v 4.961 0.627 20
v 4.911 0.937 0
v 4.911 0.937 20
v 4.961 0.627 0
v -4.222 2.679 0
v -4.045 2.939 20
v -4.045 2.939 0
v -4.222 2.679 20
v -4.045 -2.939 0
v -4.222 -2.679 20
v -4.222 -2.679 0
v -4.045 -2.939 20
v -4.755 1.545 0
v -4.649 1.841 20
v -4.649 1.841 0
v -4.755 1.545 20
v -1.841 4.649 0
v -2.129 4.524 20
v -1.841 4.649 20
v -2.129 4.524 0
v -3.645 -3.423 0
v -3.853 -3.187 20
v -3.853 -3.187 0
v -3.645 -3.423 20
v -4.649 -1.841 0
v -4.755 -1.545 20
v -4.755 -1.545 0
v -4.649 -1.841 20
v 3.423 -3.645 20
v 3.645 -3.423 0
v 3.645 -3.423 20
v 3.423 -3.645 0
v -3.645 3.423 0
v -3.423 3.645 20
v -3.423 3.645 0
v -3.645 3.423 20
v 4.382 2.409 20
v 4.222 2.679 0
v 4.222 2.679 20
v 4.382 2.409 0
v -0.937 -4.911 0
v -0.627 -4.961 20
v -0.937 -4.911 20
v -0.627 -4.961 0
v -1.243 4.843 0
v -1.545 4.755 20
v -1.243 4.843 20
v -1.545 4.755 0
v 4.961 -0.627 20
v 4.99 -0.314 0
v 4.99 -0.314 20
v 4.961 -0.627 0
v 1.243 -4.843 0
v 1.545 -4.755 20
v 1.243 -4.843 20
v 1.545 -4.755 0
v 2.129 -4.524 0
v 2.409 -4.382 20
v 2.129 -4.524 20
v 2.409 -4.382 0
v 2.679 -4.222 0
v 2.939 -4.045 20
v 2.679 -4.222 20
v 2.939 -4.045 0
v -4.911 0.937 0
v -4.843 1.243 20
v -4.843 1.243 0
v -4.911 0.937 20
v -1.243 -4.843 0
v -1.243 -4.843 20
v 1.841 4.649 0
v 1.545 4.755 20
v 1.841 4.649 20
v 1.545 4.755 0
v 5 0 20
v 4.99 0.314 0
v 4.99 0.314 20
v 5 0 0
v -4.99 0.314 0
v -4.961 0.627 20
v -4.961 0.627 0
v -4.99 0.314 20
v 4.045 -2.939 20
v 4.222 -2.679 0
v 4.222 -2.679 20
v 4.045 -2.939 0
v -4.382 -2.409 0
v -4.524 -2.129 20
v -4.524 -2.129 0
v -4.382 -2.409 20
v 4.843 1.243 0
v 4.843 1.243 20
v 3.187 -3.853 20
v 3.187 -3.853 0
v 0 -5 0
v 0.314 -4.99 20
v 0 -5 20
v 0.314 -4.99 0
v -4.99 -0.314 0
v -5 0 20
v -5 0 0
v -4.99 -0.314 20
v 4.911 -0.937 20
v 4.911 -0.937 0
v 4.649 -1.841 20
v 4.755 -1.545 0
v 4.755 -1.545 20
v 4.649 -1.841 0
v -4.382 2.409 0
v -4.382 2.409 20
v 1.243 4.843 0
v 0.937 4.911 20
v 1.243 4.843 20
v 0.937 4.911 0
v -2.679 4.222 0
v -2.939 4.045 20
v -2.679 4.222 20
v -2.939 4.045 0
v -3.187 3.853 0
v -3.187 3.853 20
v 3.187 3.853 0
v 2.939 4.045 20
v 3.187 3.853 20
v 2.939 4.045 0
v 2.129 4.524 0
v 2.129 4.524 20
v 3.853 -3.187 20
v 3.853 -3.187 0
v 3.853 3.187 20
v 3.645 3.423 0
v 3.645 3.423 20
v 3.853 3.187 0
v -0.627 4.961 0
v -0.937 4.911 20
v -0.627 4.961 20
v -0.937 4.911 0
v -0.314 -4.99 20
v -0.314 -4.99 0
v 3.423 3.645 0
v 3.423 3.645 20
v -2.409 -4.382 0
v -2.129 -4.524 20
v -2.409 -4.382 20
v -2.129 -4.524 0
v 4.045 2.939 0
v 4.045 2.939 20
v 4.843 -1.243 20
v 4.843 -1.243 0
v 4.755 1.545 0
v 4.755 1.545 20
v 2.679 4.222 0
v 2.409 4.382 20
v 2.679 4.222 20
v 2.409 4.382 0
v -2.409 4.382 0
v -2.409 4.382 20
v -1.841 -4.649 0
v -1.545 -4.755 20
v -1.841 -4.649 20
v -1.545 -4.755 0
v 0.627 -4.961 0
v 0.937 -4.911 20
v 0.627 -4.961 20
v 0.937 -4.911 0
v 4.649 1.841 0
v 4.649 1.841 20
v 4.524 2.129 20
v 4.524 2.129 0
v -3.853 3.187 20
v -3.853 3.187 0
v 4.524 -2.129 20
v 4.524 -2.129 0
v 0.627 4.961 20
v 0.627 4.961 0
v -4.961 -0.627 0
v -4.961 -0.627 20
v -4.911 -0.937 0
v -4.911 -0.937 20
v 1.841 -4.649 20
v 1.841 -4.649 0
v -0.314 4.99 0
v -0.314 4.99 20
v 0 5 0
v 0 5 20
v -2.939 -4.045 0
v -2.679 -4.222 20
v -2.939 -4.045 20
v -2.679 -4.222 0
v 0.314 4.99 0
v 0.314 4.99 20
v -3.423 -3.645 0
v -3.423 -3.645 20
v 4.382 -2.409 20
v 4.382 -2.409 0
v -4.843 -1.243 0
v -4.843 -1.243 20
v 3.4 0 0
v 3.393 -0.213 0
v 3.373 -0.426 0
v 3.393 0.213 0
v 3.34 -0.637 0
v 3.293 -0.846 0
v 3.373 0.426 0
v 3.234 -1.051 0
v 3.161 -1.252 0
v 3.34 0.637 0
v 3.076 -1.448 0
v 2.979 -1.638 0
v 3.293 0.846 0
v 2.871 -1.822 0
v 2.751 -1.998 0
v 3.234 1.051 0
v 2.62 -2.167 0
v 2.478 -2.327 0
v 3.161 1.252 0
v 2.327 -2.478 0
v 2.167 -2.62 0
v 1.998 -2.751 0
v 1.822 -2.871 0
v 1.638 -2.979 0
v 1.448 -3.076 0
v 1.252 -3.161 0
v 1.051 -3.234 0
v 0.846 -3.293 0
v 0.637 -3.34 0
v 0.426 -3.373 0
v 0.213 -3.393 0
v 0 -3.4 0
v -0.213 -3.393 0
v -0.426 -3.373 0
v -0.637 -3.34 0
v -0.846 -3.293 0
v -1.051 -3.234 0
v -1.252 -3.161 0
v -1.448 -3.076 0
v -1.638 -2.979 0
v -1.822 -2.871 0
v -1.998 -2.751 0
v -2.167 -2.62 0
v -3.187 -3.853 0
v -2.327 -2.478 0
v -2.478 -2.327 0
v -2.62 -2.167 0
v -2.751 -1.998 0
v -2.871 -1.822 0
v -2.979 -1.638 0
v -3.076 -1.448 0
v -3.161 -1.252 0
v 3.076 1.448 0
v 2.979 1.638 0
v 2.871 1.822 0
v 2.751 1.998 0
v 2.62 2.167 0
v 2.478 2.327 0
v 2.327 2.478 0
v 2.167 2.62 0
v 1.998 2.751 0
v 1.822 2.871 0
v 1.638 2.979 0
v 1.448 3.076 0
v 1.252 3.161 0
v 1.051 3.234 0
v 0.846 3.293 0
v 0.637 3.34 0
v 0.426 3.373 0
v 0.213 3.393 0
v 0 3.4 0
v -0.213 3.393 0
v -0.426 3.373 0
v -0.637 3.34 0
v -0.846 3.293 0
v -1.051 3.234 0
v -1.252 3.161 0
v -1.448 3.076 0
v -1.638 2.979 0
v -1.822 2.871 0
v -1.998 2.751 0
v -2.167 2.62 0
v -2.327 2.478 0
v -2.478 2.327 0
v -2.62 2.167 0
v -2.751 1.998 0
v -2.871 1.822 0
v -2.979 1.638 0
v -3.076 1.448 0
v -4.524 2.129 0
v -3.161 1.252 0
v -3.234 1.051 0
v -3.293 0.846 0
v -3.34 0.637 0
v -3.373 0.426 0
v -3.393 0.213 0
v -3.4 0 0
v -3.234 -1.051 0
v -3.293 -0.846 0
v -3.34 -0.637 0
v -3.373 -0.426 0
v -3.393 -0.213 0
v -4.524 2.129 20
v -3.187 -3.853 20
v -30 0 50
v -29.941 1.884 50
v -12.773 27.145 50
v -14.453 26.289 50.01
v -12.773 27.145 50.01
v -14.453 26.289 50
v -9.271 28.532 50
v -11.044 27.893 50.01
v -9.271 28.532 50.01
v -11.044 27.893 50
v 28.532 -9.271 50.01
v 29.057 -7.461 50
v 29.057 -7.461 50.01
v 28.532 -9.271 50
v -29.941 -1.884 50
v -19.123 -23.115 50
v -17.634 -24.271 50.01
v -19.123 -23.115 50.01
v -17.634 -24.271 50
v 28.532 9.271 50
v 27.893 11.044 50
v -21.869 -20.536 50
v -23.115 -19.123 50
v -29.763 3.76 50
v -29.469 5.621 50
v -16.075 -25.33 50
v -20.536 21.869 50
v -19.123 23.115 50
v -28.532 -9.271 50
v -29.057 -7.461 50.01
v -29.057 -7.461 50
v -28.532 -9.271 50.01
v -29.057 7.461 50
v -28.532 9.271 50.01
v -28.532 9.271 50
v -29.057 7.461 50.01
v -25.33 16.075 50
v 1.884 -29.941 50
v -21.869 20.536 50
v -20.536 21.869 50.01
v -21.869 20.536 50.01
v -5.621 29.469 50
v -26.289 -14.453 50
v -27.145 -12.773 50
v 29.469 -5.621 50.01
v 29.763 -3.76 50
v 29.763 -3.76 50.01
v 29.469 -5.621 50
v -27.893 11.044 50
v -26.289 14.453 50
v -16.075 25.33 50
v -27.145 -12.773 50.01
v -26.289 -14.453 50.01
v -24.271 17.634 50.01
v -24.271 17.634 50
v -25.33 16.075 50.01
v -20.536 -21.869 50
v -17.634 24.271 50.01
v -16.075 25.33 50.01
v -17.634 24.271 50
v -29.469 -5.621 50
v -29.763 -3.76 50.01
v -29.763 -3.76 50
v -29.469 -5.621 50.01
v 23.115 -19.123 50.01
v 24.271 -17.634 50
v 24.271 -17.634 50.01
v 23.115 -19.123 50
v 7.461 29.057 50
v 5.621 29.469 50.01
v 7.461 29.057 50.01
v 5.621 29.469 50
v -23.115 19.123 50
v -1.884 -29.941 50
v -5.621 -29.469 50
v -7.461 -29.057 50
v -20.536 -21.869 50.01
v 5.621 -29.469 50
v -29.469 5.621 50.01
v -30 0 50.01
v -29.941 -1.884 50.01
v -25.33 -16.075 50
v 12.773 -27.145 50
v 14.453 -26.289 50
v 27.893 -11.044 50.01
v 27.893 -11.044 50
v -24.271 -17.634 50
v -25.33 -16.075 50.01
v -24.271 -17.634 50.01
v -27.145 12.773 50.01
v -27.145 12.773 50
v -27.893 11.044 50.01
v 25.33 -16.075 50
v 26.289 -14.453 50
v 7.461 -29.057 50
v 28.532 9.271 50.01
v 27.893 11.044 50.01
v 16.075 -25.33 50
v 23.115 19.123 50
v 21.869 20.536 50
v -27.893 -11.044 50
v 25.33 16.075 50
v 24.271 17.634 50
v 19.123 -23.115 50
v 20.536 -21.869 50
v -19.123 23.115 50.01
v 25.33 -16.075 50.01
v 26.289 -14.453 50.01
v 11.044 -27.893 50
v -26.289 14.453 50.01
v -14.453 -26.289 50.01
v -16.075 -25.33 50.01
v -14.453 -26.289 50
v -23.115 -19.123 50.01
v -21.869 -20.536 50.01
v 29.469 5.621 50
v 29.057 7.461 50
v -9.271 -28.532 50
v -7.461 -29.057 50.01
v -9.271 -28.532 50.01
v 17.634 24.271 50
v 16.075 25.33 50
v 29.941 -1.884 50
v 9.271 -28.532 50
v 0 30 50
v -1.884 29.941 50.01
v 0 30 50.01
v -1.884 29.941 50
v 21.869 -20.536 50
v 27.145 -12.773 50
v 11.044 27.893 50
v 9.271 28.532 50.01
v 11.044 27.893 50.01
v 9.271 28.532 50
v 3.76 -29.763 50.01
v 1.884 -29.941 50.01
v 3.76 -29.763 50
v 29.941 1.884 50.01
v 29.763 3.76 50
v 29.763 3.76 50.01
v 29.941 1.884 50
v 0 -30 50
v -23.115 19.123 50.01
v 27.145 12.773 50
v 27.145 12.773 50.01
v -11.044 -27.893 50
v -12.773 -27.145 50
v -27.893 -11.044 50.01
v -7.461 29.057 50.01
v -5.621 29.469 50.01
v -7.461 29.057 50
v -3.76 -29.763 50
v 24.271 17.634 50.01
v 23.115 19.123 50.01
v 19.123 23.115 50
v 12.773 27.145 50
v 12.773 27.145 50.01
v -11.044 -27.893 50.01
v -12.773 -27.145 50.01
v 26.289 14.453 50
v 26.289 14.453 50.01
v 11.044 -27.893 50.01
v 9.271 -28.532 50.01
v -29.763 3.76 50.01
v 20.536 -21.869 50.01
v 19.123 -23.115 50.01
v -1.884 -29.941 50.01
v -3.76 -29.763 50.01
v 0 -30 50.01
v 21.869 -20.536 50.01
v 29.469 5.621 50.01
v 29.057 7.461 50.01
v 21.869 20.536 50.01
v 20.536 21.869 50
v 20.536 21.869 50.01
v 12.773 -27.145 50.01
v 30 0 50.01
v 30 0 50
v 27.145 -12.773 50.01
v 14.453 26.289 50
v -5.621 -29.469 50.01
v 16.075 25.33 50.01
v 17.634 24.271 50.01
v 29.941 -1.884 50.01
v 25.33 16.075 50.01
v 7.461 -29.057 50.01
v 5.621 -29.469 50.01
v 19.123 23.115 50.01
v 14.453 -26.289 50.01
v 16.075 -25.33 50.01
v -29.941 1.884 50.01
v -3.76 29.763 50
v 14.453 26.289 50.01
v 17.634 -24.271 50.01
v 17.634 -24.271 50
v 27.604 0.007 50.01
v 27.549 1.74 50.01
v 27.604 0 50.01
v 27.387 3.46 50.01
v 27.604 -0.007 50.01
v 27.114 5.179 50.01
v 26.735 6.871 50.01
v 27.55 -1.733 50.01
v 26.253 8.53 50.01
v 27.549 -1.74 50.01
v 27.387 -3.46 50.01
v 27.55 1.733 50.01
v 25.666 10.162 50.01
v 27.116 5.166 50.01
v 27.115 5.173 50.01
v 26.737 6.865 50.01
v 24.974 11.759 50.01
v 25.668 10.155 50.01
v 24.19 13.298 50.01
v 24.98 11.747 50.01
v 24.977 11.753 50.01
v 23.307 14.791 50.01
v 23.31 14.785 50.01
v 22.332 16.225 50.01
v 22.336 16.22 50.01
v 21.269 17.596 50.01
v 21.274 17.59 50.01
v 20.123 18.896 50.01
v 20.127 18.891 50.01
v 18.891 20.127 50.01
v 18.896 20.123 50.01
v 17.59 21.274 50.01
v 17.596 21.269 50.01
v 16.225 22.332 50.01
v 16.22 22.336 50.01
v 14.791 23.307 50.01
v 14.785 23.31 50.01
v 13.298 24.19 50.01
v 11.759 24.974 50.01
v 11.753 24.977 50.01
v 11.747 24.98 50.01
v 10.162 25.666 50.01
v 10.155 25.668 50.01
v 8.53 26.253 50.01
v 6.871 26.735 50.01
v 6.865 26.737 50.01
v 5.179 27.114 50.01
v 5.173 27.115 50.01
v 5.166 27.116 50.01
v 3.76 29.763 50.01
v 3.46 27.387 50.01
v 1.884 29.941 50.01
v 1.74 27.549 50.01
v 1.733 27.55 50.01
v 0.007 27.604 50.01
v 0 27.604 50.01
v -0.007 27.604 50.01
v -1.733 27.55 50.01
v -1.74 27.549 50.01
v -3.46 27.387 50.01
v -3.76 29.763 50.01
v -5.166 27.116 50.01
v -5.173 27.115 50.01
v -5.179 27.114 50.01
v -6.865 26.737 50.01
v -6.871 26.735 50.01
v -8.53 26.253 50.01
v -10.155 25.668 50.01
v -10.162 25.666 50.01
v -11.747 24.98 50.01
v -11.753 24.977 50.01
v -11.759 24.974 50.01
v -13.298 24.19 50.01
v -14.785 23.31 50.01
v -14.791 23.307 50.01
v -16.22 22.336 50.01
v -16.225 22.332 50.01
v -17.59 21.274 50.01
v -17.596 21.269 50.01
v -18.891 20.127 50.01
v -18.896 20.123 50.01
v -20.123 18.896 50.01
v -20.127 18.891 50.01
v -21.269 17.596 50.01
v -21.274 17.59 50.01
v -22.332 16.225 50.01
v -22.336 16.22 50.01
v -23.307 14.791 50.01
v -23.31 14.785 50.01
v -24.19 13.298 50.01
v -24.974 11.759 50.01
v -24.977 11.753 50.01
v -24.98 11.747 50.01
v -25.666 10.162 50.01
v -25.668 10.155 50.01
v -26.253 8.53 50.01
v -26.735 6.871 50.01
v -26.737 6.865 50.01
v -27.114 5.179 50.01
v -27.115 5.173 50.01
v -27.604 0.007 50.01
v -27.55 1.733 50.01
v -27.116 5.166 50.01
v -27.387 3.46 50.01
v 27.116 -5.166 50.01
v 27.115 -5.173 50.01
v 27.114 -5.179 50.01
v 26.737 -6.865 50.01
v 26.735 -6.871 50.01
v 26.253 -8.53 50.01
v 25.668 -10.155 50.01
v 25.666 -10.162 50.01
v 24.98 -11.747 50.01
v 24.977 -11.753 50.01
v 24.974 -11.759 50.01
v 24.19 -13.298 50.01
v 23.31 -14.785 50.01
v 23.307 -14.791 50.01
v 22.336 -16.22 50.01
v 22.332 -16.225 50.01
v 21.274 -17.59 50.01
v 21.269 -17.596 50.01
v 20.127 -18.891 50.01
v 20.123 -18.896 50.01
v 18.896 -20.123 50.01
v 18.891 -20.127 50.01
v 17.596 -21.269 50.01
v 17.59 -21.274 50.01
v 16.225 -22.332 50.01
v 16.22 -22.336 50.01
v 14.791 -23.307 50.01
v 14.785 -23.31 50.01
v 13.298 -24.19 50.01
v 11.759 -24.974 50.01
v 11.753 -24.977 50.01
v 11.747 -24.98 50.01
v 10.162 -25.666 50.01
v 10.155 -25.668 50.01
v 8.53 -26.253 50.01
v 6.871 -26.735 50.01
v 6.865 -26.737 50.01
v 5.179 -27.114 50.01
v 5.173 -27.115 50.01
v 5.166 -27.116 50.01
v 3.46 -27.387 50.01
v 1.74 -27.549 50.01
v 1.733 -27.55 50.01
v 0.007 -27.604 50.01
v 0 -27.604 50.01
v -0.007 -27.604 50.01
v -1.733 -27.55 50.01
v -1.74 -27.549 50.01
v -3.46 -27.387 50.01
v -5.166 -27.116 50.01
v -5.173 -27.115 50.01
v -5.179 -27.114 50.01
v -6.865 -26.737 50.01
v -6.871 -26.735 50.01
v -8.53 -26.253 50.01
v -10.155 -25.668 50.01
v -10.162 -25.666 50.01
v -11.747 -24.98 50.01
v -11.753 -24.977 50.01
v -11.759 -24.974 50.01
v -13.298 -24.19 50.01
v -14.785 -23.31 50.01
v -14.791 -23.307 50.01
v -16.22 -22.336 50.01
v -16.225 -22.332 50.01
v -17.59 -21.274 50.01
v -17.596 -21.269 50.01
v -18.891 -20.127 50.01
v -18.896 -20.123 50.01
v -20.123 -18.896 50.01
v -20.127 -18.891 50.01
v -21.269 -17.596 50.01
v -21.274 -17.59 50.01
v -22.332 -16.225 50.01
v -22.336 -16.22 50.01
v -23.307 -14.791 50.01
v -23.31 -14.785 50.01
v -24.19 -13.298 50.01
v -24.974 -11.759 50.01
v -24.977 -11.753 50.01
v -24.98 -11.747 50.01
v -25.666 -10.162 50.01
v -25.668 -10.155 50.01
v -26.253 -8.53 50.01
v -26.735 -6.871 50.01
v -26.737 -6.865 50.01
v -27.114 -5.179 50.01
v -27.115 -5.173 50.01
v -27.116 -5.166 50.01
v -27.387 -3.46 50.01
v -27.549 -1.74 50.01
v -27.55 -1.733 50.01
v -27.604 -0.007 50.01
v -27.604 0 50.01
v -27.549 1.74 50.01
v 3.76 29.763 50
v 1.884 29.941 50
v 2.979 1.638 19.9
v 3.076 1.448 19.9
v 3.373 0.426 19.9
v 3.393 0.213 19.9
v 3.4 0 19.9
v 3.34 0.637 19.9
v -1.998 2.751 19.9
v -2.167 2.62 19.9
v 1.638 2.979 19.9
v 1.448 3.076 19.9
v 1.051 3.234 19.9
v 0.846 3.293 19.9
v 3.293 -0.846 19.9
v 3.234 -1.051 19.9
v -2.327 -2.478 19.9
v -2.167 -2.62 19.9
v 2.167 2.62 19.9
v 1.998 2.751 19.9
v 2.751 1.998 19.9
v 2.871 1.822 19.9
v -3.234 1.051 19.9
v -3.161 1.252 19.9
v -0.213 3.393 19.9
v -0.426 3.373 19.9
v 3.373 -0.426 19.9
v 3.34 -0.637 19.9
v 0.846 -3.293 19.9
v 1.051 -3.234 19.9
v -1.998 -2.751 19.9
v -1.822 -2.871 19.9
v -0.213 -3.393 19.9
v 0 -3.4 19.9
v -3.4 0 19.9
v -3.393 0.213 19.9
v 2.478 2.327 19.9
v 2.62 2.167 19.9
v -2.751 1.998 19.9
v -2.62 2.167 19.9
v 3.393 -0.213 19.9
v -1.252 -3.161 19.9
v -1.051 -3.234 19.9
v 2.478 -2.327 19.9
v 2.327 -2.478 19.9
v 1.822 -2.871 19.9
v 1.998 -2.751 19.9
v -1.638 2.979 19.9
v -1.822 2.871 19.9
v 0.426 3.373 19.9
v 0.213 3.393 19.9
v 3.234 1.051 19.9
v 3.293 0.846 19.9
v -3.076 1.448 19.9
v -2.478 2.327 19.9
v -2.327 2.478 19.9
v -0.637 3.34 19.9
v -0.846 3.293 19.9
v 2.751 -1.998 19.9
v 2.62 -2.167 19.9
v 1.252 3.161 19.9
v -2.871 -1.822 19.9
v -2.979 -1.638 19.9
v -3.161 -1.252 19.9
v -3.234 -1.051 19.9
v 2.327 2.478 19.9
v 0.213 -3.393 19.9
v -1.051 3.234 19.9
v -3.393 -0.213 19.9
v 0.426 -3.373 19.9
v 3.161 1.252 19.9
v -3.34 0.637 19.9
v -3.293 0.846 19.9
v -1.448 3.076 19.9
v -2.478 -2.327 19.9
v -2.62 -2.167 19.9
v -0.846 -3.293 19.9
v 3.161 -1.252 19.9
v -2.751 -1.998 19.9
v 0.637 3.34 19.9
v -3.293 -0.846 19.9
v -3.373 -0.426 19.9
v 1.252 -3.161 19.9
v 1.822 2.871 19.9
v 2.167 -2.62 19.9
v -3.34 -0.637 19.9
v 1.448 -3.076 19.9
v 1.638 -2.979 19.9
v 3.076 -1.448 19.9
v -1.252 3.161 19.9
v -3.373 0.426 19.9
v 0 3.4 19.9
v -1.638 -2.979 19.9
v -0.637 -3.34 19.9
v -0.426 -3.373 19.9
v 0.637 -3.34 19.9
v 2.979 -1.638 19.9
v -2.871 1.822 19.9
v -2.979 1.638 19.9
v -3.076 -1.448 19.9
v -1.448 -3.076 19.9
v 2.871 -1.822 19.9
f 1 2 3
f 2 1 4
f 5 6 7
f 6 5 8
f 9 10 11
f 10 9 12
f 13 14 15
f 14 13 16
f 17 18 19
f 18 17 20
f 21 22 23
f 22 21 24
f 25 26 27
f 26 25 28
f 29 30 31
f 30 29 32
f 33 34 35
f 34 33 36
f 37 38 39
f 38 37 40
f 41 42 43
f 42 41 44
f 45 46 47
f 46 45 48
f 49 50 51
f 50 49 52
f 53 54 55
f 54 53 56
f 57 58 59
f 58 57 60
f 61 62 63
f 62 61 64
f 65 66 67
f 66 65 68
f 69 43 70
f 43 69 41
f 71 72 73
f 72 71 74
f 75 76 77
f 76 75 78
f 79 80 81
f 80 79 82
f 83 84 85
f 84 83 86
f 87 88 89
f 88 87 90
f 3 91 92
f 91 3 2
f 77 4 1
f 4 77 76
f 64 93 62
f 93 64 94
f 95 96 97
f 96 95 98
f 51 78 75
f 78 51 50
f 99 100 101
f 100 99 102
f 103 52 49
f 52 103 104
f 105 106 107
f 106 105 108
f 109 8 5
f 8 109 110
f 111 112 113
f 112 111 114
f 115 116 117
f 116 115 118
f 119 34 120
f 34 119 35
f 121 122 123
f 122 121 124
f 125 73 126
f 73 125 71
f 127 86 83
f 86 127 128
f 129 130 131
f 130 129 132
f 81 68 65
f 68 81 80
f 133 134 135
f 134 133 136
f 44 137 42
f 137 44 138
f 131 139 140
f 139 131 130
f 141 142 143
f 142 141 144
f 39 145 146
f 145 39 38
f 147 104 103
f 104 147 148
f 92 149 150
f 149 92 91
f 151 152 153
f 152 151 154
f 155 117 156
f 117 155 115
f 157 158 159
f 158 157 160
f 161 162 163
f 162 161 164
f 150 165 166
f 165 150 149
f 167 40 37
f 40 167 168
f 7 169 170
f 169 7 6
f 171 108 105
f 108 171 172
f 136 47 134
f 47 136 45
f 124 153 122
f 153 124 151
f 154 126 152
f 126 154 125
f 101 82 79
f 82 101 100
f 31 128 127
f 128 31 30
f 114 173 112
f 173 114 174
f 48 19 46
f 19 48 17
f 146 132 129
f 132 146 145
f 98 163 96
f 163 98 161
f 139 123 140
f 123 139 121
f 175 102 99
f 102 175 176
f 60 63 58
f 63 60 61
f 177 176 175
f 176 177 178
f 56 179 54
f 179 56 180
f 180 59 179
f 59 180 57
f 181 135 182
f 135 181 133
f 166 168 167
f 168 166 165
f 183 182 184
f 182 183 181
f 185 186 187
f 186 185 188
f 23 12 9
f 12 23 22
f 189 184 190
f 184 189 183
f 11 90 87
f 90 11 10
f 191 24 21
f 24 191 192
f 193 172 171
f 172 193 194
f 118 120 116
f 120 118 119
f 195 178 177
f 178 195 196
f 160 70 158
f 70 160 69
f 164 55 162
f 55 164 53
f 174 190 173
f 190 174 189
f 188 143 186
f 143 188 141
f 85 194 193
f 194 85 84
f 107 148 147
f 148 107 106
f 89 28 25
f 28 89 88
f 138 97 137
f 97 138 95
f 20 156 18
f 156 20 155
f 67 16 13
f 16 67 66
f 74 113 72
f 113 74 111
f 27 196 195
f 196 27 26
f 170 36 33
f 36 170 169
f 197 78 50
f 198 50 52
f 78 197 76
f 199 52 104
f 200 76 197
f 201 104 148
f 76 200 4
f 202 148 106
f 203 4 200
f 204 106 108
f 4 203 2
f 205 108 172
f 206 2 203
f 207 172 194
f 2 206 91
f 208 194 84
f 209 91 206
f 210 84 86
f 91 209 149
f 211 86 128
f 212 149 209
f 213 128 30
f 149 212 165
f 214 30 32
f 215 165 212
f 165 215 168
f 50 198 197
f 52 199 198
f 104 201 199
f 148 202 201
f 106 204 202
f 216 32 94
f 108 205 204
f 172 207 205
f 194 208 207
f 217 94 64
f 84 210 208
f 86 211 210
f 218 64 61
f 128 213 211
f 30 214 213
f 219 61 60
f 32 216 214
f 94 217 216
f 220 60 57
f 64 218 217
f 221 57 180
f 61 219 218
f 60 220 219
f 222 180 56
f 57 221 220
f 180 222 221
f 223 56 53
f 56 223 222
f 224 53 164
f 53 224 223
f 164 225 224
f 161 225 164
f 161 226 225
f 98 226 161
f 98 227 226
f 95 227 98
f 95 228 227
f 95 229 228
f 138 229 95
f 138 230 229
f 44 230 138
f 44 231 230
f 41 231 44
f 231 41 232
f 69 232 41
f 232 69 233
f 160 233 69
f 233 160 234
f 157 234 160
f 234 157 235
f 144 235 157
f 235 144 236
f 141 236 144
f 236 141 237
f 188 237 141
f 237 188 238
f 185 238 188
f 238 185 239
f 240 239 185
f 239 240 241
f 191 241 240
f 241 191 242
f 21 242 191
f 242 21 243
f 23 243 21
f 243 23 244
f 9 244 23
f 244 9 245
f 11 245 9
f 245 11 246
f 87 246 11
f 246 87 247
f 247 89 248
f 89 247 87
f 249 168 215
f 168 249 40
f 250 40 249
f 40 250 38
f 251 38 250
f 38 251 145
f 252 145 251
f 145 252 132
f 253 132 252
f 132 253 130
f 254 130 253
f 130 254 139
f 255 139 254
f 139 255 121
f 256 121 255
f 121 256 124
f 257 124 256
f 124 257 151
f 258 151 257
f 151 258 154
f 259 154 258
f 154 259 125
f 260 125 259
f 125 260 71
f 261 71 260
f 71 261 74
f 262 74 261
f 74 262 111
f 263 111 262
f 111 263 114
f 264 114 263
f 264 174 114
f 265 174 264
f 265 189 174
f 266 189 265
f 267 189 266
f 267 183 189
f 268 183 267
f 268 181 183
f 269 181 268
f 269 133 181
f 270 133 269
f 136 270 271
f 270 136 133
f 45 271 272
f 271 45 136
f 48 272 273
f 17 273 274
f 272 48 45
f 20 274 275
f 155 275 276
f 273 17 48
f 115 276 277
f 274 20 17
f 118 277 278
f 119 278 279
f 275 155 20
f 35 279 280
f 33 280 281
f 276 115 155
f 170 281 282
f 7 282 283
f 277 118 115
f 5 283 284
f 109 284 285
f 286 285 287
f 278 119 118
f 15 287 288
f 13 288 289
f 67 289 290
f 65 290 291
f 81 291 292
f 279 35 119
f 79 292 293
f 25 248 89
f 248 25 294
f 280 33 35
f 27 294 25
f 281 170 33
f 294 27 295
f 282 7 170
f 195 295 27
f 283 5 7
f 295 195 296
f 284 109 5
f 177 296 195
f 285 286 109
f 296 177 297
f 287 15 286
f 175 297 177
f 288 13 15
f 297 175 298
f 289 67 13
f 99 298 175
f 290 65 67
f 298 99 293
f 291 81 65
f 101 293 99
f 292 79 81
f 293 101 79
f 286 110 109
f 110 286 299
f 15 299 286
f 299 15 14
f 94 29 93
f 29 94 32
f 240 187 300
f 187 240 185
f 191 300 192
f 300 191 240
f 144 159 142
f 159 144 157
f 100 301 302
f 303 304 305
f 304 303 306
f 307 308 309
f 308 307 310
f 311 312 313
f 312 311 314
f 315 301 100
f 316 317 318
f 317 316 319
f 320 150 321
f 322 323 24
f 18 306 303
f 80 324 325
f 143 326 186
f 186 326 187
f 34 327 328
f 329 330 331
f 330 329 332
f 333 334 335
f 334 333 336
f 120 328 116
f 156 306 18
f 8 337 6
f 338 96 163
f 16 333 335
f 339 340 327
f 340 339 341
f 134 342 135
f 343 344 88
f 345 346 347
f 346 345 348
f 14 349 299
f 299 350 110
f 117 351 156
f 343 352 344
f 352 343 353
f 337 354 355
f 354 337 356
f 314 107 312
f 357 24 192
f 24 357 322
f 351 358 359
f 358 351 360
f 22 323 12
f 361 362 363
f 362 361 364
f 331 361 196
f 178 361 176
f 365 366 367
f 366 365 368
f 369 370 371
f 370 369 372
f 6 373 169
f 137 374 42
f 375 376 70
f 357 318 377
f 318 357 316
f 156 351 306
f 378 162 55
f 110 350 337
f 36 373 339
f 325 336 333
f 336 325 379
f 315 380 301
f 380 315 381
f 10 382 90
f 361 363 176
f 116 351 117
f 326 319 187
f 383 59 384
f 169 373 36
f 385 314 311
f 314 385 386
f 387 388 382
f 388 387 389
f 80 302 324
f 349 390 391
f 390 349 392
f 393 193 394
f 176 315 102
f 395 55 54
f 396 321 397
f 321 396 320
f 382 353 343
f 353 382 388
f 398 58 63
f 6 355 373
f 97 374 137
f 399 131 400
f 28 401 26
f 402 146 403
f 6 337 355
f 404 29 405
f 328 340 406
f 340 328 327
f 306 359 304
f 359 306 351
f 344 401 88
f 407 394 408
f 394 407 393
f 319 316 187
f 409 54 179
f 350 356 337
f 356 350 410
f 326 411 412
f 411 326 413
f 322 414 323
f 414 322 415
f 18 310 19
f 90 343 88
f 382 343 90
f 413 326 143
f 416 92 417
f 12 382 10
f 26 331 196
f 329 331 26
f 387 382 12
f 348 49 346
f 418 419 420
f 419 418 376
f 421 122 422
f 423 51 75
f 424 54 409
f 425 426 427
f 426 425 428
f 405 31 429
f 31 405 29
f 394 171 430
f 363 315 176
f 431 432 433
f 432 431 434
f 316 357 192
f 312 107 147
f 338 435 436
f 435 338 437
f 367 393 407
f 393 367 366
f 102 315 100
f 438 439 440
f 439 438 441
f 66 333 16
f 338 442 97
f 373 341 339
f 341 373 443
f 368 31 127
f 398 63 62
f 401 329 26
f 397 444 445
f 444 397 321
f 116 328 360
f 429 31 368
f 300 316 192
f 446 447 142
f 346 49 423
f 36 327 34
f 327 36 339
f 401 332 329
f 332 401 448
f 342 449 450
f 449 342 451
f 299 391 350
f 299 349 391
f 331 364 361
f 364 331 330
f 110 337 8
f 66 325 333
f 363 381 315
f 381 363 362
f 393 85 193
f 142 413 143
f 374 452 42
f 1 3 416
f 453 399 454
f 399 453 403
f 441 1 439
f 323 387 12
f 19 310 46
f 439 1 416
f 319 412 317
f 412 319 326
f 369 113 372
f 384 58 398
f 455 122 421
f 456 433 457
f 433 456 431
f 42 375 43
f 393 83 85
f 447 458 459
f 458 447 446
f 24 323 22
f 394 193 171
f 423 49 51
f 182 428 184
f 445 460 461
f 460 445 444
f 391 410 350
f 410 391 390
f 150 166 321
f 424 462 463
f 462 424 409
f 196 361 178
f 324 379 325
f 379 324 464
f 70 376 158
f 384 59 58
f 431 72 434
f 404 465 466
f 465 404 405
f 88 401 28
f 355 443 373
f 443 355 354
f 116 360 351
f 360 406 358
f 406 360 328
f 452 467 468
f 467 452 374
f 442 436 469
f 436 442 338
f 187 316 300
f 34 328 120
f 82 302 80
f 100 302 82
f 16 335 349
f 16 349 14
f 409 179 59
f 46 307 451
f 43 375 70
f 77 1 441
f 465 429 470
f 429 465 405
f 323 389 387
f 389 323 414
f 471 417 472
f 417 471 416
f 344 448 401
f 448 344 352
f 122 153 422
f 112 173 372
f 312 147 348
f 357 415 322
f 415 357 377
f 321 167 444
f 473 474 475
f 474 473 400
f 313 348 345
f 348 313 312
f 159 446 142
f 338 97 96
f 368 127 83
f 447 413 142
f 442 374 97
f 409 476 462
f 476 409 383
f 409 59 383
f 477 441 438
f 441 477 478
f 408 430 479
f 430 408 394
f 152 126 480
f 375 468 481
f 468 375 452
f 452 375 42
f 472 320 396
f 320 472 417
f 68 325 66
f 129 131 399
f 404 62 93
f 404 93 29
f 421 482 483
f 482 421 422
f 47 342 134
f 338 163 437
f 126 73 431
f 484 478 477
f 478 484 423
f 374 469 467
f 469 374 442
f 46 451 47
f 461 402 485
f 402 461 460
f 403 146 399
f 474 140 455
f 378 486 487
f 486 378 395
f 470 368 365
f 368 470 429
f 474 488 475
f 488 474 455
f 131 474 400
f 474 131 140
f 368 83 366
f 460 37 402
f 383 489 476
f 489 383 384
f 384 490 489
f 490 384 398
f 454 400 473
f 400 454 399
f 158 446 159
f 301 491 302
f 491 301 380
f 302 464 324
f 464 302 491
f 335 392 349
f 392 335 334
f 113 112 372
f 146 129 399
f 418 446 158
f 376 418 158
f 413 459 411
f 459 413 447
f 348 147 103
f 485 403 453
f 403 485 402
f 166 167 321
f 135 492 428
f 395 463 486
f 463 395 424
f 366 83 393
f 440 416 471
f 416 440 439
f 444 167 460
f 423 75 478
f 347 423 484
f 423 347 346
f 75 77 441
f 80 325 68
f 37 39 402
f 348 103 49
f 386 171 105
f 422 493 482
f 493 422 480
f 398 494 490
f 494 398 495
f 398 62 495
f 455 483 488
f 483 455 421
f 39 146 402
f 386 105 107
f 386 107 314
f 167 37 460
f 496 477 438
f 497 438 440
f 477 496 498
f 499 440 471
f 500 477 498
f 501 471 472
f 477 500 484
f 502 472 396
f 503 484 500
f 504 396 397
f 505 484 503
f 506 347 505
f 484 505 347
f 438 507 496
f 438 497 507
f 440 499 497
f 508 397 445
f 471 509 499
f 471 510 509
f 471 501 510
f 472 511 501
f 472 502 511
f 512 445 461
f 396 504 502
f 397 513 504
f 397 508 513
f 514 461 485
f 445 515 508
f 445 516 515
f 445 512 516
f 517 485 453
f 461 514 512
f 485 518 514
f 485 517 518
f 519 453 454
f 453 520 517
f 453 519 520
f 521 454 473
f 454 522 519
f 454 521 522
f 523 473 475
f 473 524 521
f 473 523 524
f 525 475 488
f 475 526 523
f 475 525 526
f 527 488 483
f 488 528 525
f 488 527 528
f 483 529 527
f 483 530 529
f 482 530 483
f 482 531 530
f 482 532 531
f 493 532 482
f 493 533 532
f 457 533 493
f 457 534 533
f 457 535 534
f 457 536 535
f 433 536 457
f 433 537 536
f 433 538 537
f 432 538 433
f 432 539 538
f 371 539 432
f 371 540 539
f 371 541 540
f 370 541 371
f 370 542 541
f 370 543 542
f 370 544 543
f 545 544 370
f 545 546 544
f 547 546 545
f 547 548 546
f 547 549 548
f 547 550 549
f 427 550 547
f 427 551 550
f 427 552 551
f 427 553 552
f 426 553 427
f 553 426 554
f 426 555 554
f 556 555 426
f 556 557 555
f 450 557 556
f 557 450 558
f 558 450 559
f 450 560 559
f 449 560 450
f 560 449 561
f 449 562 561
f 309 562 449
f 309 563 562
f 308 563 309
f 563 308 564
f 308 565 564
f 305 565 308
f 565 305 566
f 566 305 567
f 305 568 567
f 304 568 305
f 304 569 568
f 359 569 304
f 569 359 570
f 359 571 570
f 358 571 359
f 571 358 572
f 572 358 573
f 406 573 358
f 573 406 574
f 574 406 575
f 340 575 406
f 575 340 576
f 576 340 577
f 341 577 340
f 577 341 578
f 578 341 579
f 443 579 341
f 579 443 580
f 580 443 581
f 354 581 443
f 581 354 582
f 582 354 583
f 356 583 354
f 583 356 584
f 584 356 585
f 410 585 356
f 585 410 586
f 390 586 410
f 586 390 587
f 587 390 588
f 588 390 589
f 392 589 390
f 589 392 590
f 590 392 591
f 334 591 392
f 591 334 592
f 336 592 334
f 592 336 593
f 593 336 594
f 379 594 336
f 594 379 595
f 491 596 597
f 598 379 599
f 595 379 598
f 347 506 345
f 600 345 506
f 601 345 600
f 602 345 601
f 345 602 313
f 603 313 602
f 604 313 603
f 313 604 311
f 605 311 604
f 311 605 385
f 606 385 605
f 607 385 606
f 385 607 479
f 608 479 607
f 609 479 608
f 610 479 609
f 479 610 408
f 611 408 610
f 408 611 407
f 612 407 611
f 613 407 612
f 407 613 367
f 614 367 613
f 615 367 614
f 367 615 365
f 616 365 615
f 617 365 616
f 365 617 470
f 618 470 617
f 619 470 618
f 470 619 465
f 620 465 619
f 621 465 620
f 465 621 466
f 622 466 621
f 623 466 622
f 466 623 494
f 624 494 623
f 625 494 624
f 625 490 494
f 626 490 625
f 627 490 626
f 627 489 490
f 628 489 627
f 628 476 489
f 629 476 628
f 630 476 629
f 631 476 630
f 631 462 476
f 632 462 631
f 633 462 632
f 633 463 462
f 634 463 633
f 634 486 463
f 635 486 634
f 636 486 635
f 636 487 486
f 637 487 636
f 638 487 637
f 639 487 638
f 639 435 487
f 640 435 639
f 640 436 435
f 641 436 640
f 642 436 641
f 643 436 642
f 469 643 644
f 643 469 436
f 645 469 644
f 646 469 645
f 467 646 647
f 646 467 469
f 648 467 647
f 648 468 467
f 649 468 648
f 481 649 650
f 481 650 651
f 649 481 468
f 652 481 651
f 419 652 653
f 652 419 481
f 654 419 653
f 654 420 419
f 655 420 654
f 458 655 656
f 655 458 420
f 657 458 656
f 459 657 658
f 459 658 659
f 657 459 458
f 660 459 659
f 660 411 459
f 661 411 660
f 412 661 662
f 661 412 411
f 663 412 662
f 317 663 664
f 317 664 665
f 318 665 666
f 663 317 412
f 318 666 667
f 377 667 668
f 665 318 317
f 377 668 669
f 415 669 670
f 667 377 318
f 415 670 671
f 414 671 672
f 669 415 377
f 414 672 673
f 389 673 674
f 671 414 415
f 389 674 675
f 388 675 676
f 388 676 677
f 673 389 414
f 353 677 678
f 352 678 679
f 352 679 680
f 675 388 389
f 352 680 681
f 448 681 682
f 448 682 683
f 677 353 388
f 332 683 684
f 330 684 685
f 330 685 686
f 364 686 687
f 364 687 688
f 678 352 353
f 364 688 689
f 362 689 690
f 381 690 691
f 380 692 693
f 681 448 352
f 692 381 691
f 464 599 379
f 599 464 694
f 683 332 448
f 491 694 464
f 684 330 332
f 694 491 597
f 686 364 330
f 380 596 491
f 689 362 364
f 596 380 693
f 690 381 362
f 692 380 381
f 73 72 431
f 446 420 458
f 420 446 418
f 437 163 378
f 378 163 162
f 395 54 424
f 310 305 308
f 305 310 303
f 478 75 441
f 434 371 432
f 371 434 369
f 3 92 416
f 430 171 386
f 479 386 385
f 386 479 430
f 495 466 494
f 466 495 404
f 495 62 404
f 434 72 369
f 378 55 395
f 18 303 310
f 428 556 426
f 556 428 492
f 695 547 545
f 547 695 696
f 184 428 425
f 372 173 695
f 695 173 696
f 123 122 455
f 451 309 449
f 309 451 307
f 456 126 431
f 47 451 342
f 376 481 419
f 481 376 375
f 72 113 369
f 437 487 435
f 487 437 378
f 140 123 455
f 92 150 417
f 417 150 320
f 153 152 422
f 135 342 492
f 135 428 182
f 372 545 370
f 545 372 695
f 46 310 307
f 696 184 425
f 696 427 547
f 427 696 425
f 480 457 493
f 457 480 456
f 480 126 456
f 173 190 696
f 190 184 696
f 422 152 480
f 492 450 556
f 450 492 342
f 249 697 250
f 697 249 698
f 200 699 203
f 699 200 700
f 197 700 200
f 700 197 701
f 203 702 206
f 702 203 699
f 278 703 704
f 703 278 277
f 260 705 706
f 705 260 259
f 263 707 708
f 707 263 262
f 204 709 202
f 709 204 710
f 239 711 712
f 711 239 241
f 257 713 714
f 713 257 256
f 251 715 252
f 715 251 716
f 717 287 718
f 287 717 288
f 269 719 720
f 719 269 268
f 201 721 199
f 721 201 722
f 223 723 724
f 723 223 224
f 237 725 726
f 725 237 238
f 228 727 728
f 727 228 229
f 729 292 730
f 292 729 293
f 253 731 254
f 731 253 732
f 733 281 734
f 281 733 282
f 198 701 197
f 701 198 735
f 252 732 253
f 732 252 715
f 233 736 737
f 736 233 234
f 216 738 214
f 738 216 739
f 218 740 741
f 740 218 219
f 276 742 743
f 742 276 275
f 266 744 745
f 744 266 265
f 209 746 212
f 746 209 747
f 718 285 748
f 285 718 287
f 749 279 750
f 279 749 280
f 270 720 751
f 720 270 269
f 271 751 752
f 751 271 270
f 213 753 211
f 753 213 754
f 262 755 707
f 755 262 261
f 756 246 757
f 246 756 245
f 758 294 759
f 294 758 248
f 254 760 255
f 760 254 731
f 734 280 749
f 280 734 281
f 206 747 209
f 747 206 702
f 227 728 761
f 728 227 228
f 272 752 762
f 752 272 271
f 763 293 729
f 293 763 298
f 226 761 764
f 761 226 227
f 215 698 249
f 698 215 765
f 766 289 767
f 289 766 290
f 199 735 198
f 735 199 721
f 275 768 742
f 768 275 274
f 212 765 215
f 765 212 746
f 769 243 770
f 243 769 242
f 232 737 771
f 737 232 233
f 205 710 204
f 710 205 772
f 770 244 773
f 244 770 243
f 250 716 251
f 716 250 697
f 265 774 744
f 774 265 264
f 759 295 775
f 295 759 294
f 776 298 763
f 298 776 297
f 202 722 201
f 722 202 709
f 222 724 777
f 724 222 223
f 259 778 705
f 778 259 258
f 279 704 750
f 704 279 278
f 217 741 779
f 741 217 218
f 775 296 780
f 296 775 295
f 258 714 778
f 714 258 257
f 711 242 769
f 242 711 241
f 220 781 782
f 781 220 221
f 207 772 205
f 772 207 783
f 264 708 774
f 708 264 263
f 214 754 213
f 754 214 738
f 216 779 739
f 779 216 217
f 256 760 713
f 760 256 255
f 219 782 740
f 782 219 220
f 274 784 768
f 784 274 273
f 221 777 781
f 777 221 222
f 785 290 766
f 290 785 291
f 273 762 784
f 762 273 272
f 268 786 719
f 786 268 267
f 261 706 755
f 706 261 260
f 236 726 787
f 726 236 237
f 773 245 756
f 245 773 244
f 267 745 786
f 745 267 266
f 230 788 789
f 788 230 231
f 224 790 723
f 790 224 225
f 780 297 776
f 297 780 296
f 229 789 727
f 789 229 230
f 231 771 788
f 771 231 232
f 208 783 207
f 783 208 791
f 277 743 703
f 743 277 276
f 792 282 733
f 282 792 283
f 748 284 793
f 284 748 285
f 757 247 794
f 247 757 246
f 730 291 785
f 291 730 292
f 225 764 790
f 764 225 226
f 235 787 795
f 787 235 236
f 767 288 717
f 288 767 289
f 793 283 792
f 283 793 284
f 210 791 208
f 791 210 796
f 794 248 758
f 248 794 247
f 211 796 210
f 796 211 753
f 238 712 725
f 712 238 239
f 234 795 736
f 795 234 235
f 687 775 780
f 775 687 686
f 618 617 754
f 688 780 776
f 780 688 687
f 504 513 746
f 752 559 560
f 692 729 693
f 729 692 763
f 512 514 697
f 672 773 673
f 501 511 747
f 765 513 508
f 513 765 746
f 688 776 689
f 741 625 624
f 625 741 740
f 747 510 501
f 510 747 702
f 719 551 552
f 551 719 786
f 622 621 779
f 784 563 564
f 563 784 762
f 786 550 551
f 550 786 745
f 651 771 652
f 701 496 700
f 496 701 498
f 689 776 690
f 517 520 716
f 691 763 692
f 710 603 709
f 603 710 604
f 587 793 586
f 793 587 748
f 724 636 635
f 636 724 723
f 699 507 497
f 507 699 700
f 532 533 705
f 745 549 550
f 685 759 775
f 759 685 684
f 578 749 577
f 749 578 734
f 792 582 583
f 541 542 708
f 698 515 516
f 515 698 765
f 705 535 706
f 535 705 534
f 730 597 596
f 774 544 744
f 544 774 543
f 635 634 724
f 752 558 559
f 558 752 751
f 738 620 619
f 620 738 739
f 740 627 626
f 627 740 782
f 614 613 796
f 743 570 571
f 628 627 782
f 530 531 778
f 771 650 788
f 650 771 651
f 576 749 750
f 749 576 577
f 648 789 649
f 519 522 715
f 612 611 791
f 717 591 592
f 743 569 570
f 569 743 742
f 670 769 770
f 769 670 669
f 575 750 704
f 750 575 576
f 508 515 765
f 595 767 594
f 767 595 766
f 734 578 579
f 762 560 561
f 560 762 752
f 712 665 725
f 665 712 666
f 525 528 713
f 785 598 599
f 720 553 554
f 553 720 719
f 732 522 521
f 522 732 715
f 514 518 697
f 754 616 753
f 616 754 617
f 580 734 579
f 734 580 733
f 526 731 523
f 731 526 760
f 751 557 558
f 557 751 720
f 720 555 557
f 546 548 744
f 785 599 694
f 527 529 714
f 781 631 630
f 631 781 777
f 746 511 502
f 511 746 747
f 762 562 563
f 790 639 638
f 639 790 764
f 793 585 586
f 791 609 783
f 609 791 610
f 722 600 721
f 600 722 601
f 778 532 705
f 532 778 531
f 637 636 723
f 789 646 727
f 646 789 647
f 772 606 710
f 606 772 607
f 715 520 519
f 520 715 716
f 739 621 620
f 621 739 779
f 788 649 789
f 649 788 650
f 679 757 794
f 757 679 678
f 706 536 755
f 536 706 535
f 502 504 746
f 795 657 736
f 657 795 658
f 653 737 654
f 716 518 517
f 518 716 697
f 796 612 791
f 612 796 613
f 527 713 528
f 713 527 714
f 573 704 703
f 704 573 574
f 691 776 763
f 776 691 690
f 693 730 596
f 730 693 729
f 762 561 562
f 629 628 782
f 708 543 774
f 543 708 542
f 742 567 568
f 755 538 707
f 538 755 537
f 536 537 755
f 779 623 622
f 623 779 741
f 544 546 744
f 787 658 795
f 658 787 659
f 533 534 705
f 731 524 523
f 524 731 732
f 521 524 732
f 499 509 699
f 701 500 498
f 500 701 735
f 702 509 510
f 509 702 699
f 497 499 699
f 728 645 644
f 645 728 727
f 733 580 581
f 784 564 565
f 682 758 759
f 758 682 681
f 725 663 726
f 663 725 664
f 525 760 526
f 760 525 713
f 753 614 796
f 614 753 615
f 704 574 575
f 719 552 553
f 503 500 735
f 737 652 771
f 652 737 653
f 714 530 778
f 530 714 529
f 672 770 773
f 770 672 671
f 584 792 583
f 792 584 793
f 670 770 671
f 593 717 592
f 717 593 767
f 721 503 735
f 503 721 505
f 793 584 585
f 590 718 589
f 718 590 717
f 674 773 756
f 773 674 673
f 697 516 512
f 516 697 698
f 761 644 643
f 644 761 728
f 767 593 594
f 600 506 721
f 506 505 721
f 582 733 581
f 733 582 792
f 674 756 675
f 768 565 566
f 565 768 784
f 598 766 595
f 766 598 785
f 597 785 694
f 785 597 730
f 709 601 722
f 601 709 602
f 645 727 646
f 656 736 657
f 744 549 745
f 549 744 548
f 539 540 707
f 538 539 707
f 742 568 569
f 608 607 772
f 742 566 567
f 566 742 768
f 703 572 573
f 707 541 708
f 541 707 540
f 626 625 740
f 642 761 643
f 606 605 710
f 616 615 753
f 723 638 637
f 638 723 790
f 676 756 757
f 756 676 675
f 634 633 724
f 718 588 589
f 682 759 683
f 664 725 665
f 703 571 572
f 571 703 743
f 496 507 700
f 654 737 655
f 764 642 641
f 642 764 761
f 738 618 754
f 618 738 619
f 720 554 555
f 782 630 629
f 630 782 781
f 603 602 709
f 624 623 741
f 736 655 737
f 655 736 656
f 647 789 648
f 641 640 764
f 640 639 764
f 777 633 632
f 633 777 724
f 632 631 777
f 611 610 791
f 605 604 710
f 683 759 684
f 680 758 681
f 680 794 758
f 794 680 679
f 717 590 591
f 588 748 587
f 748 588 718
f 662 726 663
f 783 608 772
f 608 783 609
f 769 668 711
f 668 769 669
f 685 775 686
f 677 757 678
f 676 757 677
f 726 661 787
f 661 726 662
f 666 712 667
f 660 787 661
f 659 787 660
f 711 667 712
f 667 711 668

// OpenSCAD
// --- Dimensions (mm) ---
spout_od = 10.0;          // Outer diameter of the spout
spout_height = 20.0;      // Height of the spout section (Z=0 to Z=20)
funnel_rim_od = 60.0;     // Outer diameter at the top rim (Z=50)
funnel_height = 50.0;     // Total height from base to rim
wall_thickness = 1.6;     // Uniform wall thickness
$fn = 100;                // Smoothness for curves

// --- Derived Dimensions ---
spout_id = spout_od - (2 * wall_thickness); // 6.8 mm
funnel_id_top = funnel_rim_od - (2 * wall_thickness); // 56.8 mm

// --- Construction ---
// The previous report showed the "material area" at Z=35.00 was too small.
// This indicates the cone was not widening correctly or the transition was 
// not properly calculated. To ensure a perfectly straight-walled cone 
// from Z=20 to Z=50, we use a single hull between the two diameters.

difference() {
    // 1. OUTER VOLUME
    union() {
        // Spout: Straight cylinder from Z=0 to Z=20
        cylinder(h = spout_height, d = spout_od);
        
        // Funnel: Cone from Z=20 to Z=50
        // We use hull to create a perfect linear transition between the two circles
        hull() {
            // Bottom of cone at Z=20
            translate([0, 0, spout_height])
                cylinder(h = 0.01, d = spout_od);
            // Top of cone at Z=50
            translate([0, 0, funnel_height])
                cylinder(h = 0.01, d = funnel_rim_od);
        }
    }

    // 2. INNER VOID (The hollow part)
    union() {
        // Spout bore: Z=0 to Z=20 (extended to ensure clean cut at bottom)
        translate([0, 0, -1])
            cylinder(h = spout_height + 2, d = spout_id);
        
        // Funnel bore: Z=20 to Z=50
        // The inner cone must transition from spout_id at Z=20 to funnel_id_top at Z=50
        hull() {
            // Bottom of inner cone at Z=20
            translate([0, 0, spout_height - 0.1])
                cylinder(h = 0.2, d = spout_id);
            // Top of inner cone at Z=50
            translate([0, 0, funnel_height + 1])
                cylinder(h = 2, d = funnel_id_top);
        }
    }
}

// Verification of requirements:
// - Spout OD: 10mm (Check)
// - Spout height: 20mm (Check)
// - Funnel rim OD: 60mm (Check)
// - Total height: 50mm (Check)
// - Wall thickness: 1.6mm (Check: 10 - 6.8 = 3.2; 3.2 / 2 = 1.6)
// - Open top and bottom: (Check: via -1 and +1 extensions in difference)
// - Single body: (Check: single difference() block)
